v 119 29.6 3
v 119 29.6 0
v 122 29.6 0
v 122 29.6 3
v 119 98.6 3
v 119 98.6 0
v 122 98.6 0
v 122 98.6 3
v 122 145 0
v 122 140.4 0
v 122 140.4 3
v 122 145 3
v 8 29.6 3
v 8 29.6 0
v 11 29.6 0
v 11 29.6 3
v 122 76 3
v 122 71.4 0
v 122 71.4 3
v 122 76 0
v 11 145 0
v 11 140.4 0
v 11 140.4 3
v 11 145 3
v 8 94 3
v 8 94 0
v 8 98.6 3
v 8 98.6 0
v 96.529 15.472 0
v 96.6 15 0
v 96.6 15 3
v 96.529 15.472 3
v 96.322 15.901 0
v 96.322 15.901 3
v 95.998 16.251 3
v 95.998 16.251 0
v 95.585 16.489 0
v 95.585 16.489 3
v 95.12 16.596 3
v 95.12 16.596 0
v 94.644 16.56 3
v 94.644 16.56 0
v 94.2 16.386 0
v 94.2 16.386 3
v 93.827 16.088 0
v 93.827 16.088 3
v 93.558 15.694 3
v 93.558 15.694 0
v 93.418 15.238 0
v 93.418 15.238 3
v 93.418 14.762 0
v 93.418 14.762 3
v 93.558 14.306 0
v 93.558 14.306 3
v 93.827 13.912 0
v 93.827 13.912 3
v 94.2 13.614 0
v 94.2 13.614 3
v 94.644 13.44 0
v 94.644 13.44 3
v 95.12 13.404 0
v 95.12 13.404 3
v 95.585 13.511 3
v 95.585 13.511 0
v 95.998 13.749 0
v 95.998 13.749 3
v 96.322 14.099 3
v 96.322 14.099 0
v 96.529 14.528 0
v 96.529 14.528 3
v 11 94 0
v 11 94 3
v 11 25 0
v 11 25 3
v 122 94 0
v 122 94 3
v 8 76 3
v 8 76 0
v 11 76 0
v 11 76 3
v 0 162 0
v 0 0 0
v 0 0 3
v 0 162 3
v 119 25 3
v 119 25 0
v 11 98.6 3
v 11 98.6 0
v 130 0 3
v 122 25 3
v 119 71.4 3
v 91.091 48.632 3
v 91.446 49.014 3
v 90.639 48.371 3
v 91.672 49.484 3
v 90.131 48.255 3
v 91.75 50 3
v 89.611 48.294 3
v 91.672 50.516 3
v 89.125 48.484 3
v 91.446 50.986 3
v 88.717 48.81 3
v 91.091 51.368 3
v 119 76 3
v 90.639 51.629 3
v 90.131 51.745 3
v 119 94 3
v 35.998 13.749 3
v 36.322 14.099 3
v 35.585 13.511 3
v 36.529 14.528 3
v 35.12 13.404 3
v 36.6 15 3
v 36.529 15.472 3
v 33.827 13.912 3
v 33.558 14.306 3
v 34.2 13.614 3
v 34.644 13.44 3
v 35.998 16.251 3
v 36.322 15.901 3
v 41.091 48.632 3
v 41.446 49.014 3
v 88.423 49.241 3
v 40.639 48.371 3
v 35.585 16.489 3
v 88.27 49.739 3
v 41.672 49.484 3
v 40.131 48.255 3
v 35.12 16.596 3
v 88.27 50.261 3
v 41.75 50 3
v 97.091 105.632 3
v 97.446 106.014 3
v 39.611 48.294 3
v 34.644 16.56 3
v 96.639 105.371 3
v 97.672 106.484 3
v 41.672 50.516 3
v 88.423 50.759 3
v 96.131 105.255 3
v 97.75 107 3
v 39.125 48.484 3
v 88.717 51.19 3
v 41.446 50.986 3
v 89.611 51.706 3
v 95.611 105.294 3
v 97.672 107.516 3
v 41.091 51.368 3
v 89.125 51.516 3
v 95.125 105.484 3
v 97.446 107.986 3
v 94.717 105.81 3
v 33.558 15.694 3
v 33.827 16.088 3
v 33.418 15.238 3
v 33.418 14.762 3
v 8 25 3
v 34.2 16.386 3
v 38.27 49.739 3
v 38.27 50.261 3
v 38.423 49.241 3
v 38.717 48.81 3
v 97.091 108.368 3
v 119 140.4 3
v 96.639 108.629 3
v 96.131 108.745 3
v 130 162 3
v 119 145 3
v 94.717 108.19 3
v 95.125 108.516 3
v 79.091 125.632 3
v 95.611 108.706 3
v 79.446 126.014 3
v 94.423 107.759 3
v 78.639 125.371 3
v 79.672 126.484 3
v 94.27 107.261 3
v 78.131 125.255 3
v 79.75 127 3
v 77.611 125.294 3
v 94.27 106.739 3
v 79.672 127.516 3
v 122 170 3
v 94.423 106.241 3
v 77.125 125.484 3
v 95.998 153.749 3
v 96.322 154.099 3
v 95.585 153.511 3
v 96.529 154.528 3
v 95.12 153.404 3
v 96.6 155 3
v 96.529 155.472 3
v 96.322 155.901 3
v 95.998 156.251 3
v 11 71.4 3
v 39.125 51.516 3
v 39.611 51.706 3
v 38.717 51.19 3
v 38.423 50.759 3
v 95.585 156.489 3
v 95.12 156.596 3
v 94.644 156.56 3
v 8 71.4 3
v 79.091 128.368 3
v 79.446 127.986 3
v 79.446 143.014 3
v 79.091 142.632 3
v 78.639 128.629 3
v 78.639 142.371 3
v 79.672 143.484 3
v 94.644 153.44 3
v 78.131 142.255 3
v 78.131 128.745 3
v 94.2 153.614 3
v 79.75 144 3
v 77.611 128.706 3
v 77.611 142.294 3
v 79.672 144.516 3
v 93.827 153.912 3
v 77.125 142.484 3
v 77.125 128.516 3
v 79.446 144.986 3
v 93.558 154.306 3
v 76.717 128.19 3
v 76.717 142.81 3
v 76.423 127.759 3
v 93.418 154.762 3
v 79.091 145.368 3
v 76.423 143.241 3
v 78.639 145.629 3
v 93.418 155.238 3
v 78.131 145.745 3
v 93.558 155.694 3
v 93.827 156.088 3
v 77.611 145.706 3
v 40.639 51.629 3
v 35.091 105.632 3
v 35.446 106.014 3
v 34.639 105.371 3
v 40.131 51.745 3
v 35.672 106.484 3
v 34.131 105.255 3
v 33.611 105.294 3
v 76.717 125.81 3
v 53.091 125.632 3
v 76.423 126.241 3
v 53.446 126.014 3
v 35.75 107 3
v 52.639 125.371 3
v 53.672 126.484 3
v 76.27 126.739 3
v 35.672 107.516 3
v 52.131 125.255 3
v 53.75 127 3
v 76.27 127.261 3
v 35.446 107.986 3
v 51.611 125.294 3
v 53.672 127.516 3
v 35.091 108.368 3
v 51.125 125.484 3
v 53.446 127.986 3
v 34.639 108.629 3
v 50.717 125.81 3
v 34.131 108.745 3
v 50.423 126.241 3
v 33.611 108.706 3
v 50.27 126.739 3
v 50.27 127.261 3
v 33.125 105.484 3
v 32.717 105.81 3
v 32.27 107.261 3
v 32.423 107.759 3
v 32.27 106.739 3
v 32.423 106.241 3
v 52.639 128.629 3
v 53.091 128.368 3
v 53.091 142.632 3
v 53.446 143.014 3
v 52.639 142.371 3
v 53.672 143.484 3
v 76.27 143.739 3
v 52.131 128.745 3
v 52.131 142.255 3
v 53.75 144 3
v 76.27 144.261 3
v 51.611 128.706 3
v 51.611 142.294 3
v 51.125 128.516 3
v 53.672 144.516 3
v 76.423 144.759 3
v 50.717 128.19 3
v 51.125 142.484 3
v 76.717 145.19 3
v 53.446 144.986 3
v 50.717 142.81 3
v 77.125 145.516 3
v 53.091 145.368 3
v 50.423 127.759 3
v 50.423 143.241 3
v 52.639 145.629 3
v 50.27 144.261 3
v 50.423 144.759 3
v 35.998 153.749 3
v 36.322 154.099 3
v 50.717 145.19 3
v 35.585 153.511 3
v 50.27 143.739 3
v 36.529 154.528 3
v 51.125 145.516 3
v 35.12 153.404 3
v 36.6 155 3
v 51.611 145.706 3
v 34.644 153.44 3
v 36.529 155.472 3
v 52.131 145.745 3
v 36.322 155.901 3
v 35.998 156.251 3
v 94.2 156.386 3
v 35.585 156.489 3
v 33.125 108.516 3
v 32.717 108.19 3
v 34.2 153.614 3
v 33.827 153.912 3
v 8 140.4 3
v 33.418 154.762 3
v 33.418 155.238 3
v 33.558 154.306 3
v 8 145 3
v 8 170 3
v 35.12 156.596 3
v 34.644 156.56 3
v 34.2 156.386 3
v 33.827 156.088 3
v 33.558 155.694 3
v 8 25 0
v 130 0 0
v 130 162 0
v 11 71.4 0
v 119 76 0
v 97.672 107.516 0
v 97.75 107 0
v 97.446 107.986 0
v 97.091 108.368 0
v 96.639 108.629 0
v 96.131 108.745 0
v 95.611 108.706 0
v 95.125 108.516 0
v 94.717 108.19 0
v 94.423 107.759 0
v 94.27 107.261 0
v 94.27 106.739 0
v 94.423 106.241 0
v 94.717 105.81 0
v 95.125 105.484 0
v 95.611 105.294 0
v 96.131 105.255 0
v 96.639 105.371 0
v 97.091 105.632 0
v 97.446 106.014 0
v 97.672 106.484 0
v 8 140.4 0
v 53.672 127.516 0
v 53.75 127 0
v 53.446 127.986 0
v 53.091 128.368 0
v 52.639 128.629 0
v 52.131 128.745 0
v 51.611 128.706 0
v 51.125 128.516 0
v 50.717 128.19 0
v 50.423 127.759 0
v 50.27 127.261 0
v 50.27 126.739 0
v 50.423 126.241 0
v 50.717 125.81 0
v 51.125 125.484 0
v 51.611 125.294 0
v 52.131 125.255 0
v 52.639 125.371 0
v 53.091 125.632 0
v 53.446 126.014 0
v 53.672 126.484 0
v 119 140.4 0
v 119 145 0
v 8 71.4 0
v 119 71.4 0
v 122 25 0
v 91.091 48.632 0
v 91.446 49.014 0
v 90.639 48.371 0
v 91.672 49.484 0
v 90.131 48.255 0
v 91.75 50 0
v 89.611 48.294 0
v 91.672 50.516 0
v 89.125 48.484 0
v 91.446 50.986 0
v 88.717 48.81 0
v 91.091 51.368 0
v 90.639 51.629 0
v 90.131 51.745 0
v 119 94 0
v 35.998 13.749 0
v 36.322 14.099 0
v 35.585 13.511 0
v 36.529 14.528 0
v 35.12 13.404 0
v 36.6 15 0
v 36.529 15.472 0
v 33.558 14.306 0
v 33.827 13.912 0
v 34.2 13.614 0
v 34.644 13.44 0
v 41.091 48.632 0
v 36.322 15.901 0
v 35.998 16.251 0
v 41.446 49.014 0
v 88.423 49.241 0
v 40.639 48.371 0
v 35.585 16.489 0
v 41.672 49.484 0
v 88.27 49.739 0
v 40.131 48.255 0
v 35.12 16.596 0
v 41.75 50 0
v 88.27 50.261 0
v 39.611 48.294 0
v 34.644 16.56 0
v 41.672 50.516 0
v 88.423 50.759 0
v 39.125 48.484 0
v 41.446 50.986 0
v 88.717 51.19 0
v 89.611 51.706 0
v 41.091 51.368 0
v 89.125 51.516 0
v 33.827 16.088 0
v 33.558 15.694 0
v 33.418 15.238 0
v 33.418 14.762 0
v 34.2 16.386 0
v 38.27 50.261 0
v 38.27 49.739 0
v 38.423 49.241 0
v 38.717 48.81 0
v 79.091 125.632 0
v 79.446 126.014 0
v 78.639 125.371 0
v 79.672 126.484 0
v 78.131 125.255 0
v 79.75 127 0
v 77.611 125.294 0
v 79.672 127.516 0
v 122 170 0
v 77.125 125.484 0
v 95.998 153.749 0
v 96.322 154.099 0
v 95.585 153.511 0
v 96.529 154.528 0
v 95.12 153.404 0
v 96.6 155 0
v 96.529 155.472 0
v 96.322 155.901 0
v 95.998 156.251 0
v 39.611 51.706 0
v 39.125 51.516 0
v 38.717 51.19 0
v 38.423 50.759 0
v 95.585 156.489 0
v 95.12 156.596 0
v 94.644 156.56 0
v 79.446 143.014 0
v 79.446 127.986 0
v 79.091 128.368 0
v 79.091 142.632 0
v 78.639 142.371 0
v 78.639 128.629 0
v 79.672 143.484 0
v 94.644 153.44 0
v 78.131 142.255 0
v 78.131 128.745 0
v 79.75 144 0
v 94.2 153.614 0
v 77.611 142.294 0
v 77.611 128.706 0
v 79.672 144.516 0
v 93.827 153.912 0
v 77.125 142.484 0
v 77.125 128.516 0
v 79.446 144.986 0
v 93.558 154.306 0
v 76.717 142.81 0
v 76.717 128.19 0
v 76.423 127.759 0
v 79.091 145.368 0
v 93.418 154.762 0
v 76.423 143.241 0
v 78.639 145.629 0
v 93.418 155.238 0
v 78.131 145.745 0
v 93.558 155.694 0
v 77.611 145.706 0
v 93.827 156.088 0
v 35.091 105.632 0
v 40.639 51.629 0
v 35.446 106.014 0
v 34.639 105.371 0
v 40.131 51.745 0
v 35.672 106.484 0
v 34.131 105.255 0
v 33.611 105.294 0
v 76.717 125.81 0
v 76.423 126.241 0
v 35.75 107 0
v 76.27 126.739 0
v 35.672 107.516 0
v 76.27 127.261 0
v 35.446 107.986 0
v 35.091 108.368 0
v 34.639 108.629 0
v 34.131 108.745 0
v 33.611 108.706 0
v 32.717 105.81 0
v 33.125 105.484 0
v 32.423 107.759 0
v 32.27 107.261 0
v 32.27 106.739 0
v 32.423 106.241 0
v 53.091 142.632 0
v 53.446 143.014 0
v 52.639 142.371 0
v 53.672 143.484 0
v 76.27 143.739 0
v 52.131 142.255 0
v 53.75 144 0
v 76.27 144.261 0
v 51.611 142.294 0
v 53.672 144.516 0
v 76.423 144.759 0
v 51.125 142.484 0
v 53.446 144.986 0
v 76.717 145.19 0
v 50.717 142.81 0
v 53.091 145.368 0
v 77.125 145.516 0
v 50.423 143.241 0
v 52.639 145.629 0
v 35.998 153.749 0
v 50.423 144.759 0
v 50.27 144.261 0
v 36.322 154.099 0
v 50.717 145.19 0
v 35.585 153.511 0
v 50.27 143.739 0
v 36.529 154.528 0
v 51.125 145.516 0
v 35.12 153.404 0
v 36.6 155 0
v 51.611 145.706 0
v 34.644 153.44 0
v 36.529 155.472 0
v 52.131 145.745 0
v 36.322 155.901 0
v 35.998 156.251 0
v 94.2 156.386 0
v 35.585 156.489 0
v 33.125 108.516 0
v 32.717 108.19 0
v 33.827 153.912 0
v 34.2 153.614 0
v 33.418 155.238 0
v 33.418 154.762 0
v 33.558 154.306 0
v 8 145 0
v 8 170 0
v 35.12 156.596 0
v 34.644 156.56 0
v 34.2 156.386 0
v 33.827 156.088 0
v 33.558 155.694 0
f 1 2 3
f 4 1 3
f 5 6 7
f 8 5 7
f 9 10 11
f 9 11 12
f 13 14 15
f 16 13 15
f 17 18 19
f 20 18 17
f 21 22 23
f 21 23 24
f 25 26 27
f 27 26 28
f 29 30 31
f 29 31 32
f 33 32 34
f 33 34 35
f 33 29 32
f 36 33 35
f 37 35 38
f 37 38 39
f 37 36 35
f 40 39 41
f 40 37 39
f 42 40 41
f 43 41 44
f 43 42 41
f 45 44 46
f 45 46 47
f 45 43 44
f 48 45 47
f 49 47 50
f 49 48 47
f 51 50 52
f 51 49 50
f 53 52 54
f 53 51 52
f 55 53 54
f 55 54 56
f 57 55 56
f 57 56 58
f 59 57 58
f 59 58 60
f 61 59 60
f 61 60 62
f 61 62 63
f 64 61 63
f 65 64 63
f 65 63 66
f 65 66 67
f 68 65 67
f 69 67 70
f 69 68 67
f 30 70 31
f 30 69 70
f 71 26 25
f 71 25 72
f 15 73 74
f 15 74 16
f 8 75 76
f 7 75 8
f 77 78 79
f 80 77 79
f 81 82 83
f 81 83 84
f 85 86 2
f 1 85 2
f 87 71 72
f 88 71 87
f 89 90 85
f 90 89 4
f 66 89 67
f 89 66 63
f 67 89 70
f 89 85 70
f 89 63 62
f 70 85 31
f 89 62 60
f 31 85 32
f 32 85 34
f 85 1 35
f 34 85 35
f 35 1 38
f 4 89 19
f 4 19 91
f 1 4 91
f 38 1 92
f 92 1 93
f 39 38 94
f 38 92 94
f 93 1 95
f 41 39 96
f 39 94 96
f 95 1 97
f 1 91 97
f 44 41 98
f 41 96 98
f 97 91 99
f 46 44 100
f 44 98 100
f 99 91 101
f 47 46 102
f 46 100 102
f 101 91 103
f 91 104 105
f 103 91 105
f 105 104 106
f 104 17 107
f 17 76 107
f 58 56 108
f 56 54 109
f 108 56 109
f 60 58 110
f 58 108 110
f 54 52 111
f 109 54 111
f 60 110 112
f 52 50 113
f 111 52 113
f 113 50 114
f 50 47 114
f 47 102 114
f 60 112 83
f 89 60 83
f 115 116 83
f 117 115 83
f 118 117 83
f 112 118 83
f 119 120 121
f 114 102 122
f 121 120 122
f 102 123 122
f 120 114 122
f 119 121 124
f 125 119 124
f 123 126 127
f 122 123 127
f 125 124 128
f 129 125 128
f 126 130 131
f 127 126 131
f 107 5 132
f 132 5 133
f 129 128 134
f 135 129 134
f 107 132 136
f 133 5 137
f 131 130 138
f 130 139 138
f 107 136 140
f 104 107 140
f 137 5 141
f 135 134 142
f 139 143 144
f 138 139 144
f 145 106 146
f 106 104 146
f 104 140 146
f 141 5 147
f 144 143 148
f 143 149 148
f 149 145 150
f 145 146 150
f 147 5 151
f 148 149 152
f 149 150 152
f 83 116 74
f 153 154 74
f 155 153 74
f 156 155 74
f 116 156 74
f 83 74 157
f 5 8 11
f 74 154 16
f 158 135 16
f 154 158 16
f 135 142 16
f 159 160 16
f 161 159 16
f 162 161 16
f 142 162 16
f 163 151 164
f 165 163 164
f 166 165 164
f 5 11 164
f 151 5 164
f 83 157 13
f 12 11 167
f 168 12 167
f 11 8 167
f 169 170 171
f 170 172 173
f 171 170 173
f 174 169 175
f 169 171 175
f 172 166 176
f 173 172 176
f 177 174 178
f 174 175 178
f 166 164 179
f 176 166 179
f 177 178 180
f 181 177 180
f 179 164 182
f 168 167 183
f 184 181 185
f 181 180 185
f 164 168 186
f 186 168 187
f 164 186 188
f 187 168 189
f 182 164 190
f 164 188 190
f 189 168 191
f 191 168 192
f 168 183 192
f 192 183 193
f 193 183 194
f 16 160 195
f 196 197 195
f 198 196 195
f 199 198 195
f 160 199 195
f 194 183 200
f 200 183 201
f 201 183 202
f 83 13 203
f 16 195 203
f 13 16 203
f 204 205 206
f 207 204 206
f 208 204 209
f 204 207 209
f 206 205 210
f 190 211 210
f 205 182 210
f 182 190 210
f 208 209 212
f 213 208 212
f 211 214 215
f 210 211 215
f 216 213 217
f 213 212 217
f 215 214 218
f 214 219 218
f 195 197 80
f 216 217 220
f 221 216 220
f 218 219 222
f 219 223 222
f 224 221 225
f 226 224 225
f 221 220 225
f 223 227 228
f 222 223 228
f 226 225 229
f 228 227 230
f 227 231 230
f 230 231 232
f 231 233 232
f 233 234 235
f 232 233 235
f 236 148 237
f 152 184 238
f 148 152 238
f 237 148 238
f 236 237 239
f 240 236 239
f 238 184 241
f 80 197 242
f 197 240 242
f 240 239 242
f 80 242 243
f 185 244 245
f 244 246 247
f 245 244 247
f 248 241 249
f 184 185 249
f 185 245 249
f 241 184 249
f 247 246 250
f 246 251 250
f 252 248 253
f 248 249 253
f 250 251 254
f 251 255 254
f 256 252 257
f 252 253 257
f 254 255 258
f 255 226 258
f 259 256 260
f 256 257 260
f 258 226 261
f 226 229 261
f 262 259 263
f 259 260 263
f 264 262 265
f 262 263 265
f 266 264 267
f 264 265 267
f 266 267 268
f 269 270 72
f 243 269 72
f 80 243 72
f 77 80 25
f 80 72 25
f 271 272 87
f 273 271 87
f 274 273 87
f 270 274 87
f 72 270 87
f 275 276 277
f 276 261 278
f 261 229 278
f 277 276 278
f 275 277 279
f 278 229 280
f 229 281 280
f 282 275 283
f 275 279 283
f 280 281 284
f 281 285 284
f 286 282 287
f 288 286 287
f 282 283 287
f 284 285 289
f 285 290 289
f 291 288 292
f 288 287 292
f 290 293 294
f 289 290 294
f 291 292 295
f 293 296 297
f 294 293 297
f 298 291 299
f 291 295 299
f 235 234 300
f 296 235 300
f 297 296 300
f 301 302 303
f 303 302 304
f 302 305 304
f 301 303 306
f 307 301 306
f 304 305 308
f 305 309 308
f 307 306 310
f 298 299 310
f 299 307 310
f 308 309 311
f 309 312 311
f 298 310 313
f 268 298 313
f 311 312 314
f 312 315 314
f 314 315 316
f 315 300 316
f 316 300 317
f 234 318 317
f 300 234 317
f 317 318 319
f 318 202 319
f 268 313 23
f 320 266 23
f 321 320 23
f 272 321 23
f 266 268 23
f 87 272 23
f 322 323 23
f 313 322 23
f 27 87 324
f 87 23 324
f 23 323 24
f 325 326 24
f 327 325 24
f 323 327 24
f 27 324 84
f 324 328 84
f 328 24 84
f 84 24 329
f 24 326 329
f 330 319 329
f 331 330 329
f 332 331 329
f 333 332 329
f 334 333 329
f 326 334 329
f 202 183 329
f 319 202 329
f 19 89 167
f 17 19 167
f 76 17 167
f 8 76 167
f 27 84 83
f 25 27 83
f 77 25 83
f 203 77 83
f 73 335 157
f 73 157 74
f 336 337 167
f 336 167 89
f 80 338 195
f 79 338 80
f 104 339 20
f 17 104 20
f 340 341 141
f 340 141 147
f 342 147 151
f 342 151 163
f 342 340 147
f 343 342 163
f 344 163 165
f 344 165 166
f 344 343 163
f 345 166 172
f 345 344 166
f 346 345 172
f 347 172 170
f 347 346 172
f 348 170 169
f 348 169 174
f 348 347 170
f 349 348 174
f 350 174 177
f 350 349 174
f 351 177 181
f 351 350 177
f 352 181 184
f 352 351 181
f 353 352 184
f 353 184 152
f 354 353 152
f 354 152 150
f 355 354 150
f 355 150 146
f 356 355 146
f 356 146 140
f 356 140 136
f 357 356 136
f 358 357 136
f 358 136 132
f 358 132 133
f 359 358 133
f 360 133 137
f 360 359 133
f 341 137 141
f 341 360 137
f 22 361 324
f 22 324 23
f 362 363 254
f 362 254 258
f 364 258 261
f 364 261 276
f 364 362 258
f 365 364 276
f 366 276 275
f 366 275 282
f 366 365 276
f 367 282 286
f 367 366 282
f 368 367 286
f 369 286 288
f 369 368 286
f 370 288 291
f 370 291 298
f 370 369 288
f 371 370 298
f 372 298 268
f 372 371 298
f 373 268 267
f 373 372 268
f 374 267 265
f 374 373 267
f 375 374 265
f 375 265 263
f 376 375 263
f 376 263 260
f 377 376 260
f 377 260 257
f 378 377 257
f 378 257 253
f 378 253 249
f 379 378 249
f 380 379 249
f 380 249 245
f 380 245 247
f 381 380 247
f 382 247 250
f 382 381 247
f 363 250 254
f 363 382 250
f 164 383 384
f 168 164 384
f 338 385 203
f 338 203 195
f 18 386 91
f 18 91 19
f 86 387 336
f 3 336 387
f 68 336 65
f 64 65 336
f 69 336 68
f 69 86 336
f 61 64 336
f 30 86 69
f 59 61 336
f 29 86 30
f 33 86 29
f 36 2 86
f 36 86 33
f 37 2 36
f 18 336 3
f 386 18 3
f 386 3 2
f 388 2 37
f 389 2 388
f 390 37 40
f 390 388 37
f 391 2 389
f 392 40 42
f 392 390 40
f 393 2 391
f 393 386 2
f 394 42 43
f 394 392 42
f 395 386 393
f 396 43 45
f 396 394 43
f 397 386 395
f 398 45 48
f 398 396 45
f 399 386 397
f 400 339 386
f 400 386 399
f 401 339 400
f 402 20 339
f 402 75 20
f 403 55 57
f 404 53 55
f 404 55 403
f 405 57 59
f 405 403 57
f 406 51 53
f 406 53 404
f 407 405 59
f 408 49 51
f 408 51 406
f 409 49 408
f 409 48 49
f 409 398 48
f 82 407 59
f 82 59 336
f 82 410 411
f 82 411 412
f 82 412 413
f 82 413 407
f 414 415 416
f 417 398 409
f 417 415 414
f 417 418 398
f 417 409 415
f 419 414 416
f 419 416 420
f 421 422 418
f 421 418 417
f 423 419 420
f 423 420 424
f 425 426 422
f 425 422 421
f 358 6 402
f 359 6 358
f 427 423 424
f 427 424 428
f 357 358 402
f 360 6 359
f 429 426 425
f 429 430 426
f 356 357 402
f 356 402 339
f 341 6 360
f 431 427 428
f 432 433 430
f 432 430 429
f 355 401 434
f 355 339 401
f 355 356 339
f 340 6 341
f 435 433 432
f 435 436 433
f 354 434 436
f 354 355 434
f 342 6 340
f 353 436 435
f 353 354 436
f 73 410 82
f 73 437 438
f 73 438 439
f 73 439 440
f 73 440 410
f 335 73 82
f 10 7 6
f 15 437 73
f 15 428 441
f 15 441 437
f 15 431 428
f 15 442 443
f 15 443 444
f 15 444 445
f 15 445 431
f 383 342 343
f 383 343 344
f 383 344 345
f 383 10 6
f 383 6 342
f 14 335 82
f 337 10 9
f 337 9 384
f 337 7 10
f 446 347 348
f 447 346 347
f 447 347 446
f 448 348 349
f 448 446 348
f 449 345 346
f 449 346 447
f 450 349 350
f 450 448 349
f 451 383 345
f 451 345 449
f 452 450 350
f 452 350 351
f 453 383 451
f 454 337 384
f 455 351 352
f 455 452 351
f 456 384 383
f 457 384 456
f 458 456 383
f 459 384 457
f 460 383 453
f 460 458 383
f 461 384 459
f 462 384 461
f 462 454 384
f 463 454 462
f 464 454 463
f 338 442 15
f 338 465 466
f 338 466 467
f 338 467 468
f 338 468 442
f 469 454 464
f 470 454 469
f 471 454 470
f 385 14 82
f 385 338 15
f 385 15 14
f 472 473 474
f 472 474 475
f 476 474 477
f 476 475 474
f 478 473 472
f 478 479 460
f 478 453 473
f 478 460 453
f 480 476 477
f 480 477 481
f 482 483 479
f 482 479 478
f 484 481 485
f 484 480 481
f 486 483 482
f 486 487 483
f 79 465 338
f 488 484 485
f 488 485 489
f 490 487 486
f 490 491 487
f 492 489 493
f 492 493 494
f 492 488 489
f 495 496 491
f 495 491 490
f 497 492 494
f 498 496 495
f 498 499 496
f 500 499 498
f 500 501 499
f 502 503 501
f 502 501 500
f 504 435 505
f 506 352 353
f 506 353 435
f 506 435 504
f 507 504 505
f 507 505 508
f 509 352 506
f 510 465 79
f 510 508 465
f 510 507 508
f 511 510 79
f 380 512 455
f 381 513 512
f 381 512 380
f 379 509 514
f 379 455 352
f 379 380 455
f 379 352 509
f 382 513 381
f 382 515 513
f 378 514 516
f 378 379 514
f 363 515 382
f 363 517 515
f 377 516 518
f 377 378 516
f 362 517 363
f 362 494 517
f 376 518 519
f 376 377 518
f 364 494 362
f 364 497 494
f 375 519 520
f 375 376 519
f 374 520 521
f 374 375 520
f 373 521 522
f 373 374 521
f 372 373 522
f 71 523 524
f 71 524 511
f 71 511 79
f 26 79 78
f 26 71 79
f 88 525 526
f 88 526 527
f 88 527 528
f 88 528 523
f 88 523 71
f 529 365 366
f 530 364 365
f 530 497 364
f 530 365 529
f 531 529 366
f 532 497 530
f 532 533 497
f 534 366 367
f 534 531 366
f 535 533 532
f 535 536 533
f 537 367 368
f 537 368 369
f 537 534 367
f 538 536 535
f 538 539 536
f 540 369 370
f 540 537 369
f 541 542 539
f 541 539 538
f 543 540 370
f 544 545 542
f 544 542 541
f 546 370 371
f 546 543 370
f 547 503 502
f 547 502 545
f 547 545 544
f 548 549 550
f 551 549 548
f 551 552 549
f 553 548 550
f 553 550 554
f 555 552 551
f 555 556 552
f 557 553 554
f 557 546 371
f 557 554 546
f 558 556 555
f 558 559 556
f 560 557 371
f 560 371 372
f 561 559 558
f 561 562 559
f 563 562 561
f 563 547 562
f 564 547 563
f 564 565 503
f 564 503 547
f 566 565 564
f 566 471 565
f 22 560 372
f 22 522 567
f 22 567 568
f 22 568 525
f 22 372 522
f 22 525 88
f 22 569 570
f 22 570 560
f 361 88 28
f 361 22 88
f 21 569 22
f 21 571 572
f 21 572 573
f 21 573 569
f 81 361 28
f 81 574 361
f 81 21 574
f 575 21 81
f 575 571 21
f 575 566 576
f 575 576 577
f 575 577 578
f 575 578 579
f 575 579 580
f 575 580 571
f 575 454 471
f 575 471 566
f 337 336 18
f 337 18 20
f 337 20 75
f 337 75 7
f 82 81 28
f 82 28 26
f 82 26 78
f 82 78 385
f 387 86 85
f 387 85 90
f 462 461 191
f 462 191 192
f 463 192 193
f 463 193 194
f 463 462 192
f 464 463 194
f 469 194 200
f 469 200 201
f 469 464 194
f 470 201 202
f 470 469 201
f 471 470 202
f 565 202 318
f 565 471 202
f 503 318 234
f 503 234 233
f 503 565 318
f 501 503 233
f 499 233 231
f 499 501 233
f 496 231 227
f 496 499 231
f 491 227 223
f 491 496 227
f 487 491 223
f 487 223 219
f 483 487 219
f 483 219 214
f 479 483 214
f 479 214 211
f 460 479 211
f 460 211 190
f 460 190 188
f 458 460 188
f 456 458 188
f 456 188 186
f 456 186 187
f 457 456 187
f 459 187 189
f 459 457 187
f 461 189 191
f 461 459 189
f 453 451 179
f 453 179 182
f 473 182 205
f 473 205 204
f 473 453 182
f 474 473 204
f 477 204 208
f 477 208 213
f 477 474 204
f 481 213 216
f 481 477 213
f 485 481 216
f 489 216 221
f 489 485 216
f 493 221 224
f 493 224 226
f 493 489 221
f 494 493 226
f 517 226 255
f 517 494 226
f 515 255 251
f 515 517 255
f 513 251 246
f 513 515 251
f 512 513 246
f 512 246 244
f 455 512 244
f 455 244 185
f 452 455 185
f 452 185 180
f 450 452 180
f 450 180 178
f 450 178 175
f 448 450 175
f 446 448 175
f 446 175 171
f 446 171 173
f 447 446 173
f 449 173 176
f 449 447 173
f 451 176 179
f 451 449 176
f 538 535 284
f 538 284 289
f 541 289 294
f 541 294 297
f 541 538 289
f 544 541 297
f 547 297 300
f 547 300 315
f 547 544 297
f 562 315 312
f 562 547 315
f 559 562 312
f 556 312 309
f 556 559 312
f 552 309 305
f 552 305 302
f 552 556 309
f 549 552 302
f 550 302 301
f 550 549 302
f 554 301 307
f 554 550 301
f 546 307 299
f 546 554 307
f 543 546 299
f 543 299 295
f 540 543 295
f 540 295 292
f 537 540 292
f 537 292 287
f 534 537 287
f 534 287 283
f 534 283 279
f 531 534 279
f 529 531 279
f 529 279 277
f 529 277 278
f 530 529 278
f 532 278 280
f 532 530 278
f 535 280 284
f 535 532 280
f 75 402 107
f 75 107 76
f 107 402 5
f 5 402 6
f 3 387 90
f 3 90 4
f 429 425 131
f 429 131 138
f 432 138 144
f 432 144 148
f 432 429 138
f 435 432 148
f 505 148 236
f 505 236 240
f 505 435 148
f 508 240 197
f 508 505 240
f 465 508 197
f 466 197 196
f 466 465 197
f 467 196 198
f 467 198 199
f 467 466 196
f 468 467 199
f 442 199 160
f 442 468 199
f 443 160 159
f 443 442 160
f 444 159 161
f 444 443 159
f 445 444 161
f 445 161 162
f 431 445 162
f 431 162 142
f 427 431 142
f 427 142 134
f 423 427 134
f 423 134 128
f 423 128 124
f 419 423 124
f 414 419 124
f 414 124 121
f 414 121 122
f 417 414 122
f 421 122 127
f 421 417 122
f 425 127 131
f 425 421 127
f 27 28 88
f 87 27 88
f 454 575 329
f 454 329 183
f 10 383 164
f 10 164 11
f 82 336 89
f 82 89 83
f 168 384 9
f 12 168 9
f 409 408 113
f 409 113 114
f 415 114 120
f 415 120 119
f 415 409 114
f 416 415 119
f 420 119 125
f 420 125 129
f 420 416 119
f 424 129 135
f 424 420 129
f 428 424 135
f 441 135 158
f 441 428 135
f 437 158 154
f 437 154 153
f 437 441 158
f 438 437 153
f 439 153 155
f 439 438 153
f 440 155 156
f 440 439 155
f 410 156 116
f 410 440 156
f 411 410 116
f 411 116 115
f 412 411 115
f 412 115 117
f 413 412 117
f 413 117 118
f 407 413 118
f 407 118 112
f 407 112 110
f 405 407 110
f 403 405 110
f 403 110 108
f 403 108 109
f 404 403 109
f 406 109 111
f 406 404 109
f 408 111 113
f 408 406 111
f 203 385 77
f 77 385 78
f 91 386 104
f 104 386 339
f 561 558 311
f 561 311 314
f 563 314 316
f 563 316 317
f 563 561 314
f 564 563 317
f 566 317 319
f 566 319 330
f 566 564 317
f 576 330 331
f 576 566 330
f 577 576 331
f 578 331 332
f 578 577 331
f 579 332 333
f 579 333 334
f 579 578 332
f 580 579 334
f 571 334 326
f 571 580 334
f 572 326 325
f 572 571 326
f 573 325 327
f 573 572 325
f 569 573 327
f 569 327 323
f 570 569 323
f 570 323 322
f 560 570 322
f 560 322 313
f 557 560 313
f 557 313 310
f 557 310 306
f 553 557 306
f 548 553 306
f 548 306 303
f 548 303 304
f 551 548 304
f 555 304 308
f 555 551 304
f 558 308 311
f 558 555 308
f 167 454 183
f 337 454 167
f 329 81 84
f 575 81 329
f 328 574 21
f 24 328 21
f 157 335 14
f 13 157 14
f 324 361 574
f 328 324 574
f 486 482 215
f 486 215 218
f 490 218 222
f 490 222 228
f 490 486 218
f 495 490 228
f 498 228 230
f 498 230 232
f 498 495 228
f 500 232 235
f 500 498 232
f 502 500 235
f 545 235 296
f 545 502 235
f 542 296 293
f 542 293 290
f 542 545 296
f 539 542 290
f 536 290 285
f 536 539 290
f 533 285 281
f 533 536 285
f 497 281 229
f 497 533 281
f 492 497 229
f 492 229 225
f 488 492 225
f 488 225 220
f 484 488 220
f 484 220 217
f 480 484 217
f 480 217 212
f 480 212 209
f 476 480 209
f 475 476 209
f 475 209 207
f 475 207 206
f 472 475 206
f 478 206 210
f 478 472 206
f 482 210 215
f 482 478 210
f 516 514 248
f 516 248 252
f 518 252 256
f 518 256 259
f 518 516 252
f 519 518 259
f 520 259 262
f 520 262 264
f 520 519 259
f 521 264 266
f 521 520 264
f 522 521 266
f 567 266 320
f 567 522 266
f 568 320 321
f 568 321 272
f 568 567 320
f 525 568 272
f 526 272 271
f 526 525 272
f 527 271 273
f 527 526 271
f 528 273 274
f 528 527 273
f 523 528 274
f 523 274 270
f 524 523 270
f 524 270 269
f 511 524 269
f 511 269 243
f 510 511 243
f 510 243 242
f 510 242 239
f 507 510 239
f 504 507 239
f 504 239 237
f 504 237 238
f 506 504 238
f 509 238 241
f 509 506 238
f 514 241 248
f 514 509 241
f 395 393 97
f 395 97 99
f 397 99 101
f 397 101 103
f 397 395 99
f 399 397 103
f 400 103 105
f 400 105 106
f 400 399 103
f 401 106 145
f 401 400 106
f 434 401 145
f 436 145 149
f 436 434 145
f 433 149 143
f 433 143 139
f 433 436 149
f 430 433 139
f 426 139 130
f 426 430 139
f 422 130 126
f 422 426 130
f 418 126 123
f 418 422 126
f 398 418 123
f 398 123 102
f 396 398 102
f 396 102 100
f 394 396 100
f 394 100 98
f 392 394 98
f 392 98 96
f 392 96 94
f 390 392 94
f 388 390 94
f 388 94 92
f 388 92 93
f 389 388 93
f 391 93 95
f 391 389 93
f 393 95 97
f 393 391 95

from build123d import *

# Parameters (mm, degrees)
SKETCH_1_R      = 1.6
SKETCH_1_R_2    = 1.75
SKETCH_1_W      = 3
SKETCH_1_H      = 4.6
EXTRUDE_1_DEPTH = 3


with BuildPart() as part:
    # ｽｹｯﾁ1 → ﾎﾞｽ - 押し出し1 (new body)
    with BuildSketch(Plane.XY):
        Polygon((0, 162), (8, 170), (122, 170), (130, 162), (130, 0), (0, 0), align=None)
        with Locations((35, 155)):
            Circle(SKETCH_1_R, mode=Mode.SUBTRACT)
        with Locations((95, 155)):
            Circle(SKETCH_1_R, mode=Mode.SUBTRACT)
        with Locations((35, 15)):
            Circle(SKETCH_1_R, mode=Mode.SUBTRACT)
        with Locations((95, 15)):
            Circle(SKETCH_1_R, mode=Mode.SUBTRACT)
        with Locations((34, 107)):
            Circle(SKETCH_1_R_2, mode=Mode.SUBTRACT)
        with Locations((96, 107)):
            Circle(SKETCH_1_R_2, mode=Mode.SUBTRACT)
        with Locations((40, 50)):
            Circle(SKETCH_1_R_2, mode=Mode.SUBTRACT)
        with Locations((90, 50)):
            Circle(SKETCH_1_R_2, mode=Mode.SUBTRACT)
        with Locations((52, 144)):
            Circle(SKETCH_1_R_2, mode=Mode.SUBTRACT)
        with Locations((78, 144)):
            Circle(SKETCH_1_R_2, mode=Mode.SUBTRACT)
        with Locations((52, 127)):
            Circle(SKETCH_1_R_2, mode=Mode.SUBTRACT)
        with Locations((78, 127)):
            Circle(SKETCH_1_R_2, mode=Mode.SUBTRACT)
        with Locations((9.5, 142.7)):
            Rectangle(SKETCH_1_W, SKETCH_1_H, mode=Mode.SUBTRACT)
        with Locations((120.5, 142.7)):
            Rectangle(SKETCH_1_W, SKETCH_1_H, mode=Mode.SUBTRACT)
        with Locations((9.5, 27.3)):
            Rectangle(SKETCH_1_W, SKETCH_1_H, mode=Mode.SUBTRACT)
        with Locations((120.5, 27.3)):
            Rectangle(SKETCH_1_W, SKETCH_1_H, mode=Mode.SUBTRACT)
        with Locations((9.5, 96.3)):
            Rectangle(SKETCH_1_W, SKETCH_1_H, mode=Mode.SUBTRACT)
        with Locations((120.5, 96.3)):
            Rectangle(SKETCH_1_W, SKETCH_1_H, mode=Mode.SUBTRACT)
        with Locations((9.5, 73.7)):
            Rectangle(SKETCH_1_W, SKETCH_1_H, mode=Mode.SUBTRACT)
        with Locations((120.5, 73.7)):
            Rectangle(SKETCH_1_W, SKETCH_1_H, mode=Mode.SUBTRACT)
    extrude(amount=EXTRUDE_1_DEPTH)


solid = part.part
